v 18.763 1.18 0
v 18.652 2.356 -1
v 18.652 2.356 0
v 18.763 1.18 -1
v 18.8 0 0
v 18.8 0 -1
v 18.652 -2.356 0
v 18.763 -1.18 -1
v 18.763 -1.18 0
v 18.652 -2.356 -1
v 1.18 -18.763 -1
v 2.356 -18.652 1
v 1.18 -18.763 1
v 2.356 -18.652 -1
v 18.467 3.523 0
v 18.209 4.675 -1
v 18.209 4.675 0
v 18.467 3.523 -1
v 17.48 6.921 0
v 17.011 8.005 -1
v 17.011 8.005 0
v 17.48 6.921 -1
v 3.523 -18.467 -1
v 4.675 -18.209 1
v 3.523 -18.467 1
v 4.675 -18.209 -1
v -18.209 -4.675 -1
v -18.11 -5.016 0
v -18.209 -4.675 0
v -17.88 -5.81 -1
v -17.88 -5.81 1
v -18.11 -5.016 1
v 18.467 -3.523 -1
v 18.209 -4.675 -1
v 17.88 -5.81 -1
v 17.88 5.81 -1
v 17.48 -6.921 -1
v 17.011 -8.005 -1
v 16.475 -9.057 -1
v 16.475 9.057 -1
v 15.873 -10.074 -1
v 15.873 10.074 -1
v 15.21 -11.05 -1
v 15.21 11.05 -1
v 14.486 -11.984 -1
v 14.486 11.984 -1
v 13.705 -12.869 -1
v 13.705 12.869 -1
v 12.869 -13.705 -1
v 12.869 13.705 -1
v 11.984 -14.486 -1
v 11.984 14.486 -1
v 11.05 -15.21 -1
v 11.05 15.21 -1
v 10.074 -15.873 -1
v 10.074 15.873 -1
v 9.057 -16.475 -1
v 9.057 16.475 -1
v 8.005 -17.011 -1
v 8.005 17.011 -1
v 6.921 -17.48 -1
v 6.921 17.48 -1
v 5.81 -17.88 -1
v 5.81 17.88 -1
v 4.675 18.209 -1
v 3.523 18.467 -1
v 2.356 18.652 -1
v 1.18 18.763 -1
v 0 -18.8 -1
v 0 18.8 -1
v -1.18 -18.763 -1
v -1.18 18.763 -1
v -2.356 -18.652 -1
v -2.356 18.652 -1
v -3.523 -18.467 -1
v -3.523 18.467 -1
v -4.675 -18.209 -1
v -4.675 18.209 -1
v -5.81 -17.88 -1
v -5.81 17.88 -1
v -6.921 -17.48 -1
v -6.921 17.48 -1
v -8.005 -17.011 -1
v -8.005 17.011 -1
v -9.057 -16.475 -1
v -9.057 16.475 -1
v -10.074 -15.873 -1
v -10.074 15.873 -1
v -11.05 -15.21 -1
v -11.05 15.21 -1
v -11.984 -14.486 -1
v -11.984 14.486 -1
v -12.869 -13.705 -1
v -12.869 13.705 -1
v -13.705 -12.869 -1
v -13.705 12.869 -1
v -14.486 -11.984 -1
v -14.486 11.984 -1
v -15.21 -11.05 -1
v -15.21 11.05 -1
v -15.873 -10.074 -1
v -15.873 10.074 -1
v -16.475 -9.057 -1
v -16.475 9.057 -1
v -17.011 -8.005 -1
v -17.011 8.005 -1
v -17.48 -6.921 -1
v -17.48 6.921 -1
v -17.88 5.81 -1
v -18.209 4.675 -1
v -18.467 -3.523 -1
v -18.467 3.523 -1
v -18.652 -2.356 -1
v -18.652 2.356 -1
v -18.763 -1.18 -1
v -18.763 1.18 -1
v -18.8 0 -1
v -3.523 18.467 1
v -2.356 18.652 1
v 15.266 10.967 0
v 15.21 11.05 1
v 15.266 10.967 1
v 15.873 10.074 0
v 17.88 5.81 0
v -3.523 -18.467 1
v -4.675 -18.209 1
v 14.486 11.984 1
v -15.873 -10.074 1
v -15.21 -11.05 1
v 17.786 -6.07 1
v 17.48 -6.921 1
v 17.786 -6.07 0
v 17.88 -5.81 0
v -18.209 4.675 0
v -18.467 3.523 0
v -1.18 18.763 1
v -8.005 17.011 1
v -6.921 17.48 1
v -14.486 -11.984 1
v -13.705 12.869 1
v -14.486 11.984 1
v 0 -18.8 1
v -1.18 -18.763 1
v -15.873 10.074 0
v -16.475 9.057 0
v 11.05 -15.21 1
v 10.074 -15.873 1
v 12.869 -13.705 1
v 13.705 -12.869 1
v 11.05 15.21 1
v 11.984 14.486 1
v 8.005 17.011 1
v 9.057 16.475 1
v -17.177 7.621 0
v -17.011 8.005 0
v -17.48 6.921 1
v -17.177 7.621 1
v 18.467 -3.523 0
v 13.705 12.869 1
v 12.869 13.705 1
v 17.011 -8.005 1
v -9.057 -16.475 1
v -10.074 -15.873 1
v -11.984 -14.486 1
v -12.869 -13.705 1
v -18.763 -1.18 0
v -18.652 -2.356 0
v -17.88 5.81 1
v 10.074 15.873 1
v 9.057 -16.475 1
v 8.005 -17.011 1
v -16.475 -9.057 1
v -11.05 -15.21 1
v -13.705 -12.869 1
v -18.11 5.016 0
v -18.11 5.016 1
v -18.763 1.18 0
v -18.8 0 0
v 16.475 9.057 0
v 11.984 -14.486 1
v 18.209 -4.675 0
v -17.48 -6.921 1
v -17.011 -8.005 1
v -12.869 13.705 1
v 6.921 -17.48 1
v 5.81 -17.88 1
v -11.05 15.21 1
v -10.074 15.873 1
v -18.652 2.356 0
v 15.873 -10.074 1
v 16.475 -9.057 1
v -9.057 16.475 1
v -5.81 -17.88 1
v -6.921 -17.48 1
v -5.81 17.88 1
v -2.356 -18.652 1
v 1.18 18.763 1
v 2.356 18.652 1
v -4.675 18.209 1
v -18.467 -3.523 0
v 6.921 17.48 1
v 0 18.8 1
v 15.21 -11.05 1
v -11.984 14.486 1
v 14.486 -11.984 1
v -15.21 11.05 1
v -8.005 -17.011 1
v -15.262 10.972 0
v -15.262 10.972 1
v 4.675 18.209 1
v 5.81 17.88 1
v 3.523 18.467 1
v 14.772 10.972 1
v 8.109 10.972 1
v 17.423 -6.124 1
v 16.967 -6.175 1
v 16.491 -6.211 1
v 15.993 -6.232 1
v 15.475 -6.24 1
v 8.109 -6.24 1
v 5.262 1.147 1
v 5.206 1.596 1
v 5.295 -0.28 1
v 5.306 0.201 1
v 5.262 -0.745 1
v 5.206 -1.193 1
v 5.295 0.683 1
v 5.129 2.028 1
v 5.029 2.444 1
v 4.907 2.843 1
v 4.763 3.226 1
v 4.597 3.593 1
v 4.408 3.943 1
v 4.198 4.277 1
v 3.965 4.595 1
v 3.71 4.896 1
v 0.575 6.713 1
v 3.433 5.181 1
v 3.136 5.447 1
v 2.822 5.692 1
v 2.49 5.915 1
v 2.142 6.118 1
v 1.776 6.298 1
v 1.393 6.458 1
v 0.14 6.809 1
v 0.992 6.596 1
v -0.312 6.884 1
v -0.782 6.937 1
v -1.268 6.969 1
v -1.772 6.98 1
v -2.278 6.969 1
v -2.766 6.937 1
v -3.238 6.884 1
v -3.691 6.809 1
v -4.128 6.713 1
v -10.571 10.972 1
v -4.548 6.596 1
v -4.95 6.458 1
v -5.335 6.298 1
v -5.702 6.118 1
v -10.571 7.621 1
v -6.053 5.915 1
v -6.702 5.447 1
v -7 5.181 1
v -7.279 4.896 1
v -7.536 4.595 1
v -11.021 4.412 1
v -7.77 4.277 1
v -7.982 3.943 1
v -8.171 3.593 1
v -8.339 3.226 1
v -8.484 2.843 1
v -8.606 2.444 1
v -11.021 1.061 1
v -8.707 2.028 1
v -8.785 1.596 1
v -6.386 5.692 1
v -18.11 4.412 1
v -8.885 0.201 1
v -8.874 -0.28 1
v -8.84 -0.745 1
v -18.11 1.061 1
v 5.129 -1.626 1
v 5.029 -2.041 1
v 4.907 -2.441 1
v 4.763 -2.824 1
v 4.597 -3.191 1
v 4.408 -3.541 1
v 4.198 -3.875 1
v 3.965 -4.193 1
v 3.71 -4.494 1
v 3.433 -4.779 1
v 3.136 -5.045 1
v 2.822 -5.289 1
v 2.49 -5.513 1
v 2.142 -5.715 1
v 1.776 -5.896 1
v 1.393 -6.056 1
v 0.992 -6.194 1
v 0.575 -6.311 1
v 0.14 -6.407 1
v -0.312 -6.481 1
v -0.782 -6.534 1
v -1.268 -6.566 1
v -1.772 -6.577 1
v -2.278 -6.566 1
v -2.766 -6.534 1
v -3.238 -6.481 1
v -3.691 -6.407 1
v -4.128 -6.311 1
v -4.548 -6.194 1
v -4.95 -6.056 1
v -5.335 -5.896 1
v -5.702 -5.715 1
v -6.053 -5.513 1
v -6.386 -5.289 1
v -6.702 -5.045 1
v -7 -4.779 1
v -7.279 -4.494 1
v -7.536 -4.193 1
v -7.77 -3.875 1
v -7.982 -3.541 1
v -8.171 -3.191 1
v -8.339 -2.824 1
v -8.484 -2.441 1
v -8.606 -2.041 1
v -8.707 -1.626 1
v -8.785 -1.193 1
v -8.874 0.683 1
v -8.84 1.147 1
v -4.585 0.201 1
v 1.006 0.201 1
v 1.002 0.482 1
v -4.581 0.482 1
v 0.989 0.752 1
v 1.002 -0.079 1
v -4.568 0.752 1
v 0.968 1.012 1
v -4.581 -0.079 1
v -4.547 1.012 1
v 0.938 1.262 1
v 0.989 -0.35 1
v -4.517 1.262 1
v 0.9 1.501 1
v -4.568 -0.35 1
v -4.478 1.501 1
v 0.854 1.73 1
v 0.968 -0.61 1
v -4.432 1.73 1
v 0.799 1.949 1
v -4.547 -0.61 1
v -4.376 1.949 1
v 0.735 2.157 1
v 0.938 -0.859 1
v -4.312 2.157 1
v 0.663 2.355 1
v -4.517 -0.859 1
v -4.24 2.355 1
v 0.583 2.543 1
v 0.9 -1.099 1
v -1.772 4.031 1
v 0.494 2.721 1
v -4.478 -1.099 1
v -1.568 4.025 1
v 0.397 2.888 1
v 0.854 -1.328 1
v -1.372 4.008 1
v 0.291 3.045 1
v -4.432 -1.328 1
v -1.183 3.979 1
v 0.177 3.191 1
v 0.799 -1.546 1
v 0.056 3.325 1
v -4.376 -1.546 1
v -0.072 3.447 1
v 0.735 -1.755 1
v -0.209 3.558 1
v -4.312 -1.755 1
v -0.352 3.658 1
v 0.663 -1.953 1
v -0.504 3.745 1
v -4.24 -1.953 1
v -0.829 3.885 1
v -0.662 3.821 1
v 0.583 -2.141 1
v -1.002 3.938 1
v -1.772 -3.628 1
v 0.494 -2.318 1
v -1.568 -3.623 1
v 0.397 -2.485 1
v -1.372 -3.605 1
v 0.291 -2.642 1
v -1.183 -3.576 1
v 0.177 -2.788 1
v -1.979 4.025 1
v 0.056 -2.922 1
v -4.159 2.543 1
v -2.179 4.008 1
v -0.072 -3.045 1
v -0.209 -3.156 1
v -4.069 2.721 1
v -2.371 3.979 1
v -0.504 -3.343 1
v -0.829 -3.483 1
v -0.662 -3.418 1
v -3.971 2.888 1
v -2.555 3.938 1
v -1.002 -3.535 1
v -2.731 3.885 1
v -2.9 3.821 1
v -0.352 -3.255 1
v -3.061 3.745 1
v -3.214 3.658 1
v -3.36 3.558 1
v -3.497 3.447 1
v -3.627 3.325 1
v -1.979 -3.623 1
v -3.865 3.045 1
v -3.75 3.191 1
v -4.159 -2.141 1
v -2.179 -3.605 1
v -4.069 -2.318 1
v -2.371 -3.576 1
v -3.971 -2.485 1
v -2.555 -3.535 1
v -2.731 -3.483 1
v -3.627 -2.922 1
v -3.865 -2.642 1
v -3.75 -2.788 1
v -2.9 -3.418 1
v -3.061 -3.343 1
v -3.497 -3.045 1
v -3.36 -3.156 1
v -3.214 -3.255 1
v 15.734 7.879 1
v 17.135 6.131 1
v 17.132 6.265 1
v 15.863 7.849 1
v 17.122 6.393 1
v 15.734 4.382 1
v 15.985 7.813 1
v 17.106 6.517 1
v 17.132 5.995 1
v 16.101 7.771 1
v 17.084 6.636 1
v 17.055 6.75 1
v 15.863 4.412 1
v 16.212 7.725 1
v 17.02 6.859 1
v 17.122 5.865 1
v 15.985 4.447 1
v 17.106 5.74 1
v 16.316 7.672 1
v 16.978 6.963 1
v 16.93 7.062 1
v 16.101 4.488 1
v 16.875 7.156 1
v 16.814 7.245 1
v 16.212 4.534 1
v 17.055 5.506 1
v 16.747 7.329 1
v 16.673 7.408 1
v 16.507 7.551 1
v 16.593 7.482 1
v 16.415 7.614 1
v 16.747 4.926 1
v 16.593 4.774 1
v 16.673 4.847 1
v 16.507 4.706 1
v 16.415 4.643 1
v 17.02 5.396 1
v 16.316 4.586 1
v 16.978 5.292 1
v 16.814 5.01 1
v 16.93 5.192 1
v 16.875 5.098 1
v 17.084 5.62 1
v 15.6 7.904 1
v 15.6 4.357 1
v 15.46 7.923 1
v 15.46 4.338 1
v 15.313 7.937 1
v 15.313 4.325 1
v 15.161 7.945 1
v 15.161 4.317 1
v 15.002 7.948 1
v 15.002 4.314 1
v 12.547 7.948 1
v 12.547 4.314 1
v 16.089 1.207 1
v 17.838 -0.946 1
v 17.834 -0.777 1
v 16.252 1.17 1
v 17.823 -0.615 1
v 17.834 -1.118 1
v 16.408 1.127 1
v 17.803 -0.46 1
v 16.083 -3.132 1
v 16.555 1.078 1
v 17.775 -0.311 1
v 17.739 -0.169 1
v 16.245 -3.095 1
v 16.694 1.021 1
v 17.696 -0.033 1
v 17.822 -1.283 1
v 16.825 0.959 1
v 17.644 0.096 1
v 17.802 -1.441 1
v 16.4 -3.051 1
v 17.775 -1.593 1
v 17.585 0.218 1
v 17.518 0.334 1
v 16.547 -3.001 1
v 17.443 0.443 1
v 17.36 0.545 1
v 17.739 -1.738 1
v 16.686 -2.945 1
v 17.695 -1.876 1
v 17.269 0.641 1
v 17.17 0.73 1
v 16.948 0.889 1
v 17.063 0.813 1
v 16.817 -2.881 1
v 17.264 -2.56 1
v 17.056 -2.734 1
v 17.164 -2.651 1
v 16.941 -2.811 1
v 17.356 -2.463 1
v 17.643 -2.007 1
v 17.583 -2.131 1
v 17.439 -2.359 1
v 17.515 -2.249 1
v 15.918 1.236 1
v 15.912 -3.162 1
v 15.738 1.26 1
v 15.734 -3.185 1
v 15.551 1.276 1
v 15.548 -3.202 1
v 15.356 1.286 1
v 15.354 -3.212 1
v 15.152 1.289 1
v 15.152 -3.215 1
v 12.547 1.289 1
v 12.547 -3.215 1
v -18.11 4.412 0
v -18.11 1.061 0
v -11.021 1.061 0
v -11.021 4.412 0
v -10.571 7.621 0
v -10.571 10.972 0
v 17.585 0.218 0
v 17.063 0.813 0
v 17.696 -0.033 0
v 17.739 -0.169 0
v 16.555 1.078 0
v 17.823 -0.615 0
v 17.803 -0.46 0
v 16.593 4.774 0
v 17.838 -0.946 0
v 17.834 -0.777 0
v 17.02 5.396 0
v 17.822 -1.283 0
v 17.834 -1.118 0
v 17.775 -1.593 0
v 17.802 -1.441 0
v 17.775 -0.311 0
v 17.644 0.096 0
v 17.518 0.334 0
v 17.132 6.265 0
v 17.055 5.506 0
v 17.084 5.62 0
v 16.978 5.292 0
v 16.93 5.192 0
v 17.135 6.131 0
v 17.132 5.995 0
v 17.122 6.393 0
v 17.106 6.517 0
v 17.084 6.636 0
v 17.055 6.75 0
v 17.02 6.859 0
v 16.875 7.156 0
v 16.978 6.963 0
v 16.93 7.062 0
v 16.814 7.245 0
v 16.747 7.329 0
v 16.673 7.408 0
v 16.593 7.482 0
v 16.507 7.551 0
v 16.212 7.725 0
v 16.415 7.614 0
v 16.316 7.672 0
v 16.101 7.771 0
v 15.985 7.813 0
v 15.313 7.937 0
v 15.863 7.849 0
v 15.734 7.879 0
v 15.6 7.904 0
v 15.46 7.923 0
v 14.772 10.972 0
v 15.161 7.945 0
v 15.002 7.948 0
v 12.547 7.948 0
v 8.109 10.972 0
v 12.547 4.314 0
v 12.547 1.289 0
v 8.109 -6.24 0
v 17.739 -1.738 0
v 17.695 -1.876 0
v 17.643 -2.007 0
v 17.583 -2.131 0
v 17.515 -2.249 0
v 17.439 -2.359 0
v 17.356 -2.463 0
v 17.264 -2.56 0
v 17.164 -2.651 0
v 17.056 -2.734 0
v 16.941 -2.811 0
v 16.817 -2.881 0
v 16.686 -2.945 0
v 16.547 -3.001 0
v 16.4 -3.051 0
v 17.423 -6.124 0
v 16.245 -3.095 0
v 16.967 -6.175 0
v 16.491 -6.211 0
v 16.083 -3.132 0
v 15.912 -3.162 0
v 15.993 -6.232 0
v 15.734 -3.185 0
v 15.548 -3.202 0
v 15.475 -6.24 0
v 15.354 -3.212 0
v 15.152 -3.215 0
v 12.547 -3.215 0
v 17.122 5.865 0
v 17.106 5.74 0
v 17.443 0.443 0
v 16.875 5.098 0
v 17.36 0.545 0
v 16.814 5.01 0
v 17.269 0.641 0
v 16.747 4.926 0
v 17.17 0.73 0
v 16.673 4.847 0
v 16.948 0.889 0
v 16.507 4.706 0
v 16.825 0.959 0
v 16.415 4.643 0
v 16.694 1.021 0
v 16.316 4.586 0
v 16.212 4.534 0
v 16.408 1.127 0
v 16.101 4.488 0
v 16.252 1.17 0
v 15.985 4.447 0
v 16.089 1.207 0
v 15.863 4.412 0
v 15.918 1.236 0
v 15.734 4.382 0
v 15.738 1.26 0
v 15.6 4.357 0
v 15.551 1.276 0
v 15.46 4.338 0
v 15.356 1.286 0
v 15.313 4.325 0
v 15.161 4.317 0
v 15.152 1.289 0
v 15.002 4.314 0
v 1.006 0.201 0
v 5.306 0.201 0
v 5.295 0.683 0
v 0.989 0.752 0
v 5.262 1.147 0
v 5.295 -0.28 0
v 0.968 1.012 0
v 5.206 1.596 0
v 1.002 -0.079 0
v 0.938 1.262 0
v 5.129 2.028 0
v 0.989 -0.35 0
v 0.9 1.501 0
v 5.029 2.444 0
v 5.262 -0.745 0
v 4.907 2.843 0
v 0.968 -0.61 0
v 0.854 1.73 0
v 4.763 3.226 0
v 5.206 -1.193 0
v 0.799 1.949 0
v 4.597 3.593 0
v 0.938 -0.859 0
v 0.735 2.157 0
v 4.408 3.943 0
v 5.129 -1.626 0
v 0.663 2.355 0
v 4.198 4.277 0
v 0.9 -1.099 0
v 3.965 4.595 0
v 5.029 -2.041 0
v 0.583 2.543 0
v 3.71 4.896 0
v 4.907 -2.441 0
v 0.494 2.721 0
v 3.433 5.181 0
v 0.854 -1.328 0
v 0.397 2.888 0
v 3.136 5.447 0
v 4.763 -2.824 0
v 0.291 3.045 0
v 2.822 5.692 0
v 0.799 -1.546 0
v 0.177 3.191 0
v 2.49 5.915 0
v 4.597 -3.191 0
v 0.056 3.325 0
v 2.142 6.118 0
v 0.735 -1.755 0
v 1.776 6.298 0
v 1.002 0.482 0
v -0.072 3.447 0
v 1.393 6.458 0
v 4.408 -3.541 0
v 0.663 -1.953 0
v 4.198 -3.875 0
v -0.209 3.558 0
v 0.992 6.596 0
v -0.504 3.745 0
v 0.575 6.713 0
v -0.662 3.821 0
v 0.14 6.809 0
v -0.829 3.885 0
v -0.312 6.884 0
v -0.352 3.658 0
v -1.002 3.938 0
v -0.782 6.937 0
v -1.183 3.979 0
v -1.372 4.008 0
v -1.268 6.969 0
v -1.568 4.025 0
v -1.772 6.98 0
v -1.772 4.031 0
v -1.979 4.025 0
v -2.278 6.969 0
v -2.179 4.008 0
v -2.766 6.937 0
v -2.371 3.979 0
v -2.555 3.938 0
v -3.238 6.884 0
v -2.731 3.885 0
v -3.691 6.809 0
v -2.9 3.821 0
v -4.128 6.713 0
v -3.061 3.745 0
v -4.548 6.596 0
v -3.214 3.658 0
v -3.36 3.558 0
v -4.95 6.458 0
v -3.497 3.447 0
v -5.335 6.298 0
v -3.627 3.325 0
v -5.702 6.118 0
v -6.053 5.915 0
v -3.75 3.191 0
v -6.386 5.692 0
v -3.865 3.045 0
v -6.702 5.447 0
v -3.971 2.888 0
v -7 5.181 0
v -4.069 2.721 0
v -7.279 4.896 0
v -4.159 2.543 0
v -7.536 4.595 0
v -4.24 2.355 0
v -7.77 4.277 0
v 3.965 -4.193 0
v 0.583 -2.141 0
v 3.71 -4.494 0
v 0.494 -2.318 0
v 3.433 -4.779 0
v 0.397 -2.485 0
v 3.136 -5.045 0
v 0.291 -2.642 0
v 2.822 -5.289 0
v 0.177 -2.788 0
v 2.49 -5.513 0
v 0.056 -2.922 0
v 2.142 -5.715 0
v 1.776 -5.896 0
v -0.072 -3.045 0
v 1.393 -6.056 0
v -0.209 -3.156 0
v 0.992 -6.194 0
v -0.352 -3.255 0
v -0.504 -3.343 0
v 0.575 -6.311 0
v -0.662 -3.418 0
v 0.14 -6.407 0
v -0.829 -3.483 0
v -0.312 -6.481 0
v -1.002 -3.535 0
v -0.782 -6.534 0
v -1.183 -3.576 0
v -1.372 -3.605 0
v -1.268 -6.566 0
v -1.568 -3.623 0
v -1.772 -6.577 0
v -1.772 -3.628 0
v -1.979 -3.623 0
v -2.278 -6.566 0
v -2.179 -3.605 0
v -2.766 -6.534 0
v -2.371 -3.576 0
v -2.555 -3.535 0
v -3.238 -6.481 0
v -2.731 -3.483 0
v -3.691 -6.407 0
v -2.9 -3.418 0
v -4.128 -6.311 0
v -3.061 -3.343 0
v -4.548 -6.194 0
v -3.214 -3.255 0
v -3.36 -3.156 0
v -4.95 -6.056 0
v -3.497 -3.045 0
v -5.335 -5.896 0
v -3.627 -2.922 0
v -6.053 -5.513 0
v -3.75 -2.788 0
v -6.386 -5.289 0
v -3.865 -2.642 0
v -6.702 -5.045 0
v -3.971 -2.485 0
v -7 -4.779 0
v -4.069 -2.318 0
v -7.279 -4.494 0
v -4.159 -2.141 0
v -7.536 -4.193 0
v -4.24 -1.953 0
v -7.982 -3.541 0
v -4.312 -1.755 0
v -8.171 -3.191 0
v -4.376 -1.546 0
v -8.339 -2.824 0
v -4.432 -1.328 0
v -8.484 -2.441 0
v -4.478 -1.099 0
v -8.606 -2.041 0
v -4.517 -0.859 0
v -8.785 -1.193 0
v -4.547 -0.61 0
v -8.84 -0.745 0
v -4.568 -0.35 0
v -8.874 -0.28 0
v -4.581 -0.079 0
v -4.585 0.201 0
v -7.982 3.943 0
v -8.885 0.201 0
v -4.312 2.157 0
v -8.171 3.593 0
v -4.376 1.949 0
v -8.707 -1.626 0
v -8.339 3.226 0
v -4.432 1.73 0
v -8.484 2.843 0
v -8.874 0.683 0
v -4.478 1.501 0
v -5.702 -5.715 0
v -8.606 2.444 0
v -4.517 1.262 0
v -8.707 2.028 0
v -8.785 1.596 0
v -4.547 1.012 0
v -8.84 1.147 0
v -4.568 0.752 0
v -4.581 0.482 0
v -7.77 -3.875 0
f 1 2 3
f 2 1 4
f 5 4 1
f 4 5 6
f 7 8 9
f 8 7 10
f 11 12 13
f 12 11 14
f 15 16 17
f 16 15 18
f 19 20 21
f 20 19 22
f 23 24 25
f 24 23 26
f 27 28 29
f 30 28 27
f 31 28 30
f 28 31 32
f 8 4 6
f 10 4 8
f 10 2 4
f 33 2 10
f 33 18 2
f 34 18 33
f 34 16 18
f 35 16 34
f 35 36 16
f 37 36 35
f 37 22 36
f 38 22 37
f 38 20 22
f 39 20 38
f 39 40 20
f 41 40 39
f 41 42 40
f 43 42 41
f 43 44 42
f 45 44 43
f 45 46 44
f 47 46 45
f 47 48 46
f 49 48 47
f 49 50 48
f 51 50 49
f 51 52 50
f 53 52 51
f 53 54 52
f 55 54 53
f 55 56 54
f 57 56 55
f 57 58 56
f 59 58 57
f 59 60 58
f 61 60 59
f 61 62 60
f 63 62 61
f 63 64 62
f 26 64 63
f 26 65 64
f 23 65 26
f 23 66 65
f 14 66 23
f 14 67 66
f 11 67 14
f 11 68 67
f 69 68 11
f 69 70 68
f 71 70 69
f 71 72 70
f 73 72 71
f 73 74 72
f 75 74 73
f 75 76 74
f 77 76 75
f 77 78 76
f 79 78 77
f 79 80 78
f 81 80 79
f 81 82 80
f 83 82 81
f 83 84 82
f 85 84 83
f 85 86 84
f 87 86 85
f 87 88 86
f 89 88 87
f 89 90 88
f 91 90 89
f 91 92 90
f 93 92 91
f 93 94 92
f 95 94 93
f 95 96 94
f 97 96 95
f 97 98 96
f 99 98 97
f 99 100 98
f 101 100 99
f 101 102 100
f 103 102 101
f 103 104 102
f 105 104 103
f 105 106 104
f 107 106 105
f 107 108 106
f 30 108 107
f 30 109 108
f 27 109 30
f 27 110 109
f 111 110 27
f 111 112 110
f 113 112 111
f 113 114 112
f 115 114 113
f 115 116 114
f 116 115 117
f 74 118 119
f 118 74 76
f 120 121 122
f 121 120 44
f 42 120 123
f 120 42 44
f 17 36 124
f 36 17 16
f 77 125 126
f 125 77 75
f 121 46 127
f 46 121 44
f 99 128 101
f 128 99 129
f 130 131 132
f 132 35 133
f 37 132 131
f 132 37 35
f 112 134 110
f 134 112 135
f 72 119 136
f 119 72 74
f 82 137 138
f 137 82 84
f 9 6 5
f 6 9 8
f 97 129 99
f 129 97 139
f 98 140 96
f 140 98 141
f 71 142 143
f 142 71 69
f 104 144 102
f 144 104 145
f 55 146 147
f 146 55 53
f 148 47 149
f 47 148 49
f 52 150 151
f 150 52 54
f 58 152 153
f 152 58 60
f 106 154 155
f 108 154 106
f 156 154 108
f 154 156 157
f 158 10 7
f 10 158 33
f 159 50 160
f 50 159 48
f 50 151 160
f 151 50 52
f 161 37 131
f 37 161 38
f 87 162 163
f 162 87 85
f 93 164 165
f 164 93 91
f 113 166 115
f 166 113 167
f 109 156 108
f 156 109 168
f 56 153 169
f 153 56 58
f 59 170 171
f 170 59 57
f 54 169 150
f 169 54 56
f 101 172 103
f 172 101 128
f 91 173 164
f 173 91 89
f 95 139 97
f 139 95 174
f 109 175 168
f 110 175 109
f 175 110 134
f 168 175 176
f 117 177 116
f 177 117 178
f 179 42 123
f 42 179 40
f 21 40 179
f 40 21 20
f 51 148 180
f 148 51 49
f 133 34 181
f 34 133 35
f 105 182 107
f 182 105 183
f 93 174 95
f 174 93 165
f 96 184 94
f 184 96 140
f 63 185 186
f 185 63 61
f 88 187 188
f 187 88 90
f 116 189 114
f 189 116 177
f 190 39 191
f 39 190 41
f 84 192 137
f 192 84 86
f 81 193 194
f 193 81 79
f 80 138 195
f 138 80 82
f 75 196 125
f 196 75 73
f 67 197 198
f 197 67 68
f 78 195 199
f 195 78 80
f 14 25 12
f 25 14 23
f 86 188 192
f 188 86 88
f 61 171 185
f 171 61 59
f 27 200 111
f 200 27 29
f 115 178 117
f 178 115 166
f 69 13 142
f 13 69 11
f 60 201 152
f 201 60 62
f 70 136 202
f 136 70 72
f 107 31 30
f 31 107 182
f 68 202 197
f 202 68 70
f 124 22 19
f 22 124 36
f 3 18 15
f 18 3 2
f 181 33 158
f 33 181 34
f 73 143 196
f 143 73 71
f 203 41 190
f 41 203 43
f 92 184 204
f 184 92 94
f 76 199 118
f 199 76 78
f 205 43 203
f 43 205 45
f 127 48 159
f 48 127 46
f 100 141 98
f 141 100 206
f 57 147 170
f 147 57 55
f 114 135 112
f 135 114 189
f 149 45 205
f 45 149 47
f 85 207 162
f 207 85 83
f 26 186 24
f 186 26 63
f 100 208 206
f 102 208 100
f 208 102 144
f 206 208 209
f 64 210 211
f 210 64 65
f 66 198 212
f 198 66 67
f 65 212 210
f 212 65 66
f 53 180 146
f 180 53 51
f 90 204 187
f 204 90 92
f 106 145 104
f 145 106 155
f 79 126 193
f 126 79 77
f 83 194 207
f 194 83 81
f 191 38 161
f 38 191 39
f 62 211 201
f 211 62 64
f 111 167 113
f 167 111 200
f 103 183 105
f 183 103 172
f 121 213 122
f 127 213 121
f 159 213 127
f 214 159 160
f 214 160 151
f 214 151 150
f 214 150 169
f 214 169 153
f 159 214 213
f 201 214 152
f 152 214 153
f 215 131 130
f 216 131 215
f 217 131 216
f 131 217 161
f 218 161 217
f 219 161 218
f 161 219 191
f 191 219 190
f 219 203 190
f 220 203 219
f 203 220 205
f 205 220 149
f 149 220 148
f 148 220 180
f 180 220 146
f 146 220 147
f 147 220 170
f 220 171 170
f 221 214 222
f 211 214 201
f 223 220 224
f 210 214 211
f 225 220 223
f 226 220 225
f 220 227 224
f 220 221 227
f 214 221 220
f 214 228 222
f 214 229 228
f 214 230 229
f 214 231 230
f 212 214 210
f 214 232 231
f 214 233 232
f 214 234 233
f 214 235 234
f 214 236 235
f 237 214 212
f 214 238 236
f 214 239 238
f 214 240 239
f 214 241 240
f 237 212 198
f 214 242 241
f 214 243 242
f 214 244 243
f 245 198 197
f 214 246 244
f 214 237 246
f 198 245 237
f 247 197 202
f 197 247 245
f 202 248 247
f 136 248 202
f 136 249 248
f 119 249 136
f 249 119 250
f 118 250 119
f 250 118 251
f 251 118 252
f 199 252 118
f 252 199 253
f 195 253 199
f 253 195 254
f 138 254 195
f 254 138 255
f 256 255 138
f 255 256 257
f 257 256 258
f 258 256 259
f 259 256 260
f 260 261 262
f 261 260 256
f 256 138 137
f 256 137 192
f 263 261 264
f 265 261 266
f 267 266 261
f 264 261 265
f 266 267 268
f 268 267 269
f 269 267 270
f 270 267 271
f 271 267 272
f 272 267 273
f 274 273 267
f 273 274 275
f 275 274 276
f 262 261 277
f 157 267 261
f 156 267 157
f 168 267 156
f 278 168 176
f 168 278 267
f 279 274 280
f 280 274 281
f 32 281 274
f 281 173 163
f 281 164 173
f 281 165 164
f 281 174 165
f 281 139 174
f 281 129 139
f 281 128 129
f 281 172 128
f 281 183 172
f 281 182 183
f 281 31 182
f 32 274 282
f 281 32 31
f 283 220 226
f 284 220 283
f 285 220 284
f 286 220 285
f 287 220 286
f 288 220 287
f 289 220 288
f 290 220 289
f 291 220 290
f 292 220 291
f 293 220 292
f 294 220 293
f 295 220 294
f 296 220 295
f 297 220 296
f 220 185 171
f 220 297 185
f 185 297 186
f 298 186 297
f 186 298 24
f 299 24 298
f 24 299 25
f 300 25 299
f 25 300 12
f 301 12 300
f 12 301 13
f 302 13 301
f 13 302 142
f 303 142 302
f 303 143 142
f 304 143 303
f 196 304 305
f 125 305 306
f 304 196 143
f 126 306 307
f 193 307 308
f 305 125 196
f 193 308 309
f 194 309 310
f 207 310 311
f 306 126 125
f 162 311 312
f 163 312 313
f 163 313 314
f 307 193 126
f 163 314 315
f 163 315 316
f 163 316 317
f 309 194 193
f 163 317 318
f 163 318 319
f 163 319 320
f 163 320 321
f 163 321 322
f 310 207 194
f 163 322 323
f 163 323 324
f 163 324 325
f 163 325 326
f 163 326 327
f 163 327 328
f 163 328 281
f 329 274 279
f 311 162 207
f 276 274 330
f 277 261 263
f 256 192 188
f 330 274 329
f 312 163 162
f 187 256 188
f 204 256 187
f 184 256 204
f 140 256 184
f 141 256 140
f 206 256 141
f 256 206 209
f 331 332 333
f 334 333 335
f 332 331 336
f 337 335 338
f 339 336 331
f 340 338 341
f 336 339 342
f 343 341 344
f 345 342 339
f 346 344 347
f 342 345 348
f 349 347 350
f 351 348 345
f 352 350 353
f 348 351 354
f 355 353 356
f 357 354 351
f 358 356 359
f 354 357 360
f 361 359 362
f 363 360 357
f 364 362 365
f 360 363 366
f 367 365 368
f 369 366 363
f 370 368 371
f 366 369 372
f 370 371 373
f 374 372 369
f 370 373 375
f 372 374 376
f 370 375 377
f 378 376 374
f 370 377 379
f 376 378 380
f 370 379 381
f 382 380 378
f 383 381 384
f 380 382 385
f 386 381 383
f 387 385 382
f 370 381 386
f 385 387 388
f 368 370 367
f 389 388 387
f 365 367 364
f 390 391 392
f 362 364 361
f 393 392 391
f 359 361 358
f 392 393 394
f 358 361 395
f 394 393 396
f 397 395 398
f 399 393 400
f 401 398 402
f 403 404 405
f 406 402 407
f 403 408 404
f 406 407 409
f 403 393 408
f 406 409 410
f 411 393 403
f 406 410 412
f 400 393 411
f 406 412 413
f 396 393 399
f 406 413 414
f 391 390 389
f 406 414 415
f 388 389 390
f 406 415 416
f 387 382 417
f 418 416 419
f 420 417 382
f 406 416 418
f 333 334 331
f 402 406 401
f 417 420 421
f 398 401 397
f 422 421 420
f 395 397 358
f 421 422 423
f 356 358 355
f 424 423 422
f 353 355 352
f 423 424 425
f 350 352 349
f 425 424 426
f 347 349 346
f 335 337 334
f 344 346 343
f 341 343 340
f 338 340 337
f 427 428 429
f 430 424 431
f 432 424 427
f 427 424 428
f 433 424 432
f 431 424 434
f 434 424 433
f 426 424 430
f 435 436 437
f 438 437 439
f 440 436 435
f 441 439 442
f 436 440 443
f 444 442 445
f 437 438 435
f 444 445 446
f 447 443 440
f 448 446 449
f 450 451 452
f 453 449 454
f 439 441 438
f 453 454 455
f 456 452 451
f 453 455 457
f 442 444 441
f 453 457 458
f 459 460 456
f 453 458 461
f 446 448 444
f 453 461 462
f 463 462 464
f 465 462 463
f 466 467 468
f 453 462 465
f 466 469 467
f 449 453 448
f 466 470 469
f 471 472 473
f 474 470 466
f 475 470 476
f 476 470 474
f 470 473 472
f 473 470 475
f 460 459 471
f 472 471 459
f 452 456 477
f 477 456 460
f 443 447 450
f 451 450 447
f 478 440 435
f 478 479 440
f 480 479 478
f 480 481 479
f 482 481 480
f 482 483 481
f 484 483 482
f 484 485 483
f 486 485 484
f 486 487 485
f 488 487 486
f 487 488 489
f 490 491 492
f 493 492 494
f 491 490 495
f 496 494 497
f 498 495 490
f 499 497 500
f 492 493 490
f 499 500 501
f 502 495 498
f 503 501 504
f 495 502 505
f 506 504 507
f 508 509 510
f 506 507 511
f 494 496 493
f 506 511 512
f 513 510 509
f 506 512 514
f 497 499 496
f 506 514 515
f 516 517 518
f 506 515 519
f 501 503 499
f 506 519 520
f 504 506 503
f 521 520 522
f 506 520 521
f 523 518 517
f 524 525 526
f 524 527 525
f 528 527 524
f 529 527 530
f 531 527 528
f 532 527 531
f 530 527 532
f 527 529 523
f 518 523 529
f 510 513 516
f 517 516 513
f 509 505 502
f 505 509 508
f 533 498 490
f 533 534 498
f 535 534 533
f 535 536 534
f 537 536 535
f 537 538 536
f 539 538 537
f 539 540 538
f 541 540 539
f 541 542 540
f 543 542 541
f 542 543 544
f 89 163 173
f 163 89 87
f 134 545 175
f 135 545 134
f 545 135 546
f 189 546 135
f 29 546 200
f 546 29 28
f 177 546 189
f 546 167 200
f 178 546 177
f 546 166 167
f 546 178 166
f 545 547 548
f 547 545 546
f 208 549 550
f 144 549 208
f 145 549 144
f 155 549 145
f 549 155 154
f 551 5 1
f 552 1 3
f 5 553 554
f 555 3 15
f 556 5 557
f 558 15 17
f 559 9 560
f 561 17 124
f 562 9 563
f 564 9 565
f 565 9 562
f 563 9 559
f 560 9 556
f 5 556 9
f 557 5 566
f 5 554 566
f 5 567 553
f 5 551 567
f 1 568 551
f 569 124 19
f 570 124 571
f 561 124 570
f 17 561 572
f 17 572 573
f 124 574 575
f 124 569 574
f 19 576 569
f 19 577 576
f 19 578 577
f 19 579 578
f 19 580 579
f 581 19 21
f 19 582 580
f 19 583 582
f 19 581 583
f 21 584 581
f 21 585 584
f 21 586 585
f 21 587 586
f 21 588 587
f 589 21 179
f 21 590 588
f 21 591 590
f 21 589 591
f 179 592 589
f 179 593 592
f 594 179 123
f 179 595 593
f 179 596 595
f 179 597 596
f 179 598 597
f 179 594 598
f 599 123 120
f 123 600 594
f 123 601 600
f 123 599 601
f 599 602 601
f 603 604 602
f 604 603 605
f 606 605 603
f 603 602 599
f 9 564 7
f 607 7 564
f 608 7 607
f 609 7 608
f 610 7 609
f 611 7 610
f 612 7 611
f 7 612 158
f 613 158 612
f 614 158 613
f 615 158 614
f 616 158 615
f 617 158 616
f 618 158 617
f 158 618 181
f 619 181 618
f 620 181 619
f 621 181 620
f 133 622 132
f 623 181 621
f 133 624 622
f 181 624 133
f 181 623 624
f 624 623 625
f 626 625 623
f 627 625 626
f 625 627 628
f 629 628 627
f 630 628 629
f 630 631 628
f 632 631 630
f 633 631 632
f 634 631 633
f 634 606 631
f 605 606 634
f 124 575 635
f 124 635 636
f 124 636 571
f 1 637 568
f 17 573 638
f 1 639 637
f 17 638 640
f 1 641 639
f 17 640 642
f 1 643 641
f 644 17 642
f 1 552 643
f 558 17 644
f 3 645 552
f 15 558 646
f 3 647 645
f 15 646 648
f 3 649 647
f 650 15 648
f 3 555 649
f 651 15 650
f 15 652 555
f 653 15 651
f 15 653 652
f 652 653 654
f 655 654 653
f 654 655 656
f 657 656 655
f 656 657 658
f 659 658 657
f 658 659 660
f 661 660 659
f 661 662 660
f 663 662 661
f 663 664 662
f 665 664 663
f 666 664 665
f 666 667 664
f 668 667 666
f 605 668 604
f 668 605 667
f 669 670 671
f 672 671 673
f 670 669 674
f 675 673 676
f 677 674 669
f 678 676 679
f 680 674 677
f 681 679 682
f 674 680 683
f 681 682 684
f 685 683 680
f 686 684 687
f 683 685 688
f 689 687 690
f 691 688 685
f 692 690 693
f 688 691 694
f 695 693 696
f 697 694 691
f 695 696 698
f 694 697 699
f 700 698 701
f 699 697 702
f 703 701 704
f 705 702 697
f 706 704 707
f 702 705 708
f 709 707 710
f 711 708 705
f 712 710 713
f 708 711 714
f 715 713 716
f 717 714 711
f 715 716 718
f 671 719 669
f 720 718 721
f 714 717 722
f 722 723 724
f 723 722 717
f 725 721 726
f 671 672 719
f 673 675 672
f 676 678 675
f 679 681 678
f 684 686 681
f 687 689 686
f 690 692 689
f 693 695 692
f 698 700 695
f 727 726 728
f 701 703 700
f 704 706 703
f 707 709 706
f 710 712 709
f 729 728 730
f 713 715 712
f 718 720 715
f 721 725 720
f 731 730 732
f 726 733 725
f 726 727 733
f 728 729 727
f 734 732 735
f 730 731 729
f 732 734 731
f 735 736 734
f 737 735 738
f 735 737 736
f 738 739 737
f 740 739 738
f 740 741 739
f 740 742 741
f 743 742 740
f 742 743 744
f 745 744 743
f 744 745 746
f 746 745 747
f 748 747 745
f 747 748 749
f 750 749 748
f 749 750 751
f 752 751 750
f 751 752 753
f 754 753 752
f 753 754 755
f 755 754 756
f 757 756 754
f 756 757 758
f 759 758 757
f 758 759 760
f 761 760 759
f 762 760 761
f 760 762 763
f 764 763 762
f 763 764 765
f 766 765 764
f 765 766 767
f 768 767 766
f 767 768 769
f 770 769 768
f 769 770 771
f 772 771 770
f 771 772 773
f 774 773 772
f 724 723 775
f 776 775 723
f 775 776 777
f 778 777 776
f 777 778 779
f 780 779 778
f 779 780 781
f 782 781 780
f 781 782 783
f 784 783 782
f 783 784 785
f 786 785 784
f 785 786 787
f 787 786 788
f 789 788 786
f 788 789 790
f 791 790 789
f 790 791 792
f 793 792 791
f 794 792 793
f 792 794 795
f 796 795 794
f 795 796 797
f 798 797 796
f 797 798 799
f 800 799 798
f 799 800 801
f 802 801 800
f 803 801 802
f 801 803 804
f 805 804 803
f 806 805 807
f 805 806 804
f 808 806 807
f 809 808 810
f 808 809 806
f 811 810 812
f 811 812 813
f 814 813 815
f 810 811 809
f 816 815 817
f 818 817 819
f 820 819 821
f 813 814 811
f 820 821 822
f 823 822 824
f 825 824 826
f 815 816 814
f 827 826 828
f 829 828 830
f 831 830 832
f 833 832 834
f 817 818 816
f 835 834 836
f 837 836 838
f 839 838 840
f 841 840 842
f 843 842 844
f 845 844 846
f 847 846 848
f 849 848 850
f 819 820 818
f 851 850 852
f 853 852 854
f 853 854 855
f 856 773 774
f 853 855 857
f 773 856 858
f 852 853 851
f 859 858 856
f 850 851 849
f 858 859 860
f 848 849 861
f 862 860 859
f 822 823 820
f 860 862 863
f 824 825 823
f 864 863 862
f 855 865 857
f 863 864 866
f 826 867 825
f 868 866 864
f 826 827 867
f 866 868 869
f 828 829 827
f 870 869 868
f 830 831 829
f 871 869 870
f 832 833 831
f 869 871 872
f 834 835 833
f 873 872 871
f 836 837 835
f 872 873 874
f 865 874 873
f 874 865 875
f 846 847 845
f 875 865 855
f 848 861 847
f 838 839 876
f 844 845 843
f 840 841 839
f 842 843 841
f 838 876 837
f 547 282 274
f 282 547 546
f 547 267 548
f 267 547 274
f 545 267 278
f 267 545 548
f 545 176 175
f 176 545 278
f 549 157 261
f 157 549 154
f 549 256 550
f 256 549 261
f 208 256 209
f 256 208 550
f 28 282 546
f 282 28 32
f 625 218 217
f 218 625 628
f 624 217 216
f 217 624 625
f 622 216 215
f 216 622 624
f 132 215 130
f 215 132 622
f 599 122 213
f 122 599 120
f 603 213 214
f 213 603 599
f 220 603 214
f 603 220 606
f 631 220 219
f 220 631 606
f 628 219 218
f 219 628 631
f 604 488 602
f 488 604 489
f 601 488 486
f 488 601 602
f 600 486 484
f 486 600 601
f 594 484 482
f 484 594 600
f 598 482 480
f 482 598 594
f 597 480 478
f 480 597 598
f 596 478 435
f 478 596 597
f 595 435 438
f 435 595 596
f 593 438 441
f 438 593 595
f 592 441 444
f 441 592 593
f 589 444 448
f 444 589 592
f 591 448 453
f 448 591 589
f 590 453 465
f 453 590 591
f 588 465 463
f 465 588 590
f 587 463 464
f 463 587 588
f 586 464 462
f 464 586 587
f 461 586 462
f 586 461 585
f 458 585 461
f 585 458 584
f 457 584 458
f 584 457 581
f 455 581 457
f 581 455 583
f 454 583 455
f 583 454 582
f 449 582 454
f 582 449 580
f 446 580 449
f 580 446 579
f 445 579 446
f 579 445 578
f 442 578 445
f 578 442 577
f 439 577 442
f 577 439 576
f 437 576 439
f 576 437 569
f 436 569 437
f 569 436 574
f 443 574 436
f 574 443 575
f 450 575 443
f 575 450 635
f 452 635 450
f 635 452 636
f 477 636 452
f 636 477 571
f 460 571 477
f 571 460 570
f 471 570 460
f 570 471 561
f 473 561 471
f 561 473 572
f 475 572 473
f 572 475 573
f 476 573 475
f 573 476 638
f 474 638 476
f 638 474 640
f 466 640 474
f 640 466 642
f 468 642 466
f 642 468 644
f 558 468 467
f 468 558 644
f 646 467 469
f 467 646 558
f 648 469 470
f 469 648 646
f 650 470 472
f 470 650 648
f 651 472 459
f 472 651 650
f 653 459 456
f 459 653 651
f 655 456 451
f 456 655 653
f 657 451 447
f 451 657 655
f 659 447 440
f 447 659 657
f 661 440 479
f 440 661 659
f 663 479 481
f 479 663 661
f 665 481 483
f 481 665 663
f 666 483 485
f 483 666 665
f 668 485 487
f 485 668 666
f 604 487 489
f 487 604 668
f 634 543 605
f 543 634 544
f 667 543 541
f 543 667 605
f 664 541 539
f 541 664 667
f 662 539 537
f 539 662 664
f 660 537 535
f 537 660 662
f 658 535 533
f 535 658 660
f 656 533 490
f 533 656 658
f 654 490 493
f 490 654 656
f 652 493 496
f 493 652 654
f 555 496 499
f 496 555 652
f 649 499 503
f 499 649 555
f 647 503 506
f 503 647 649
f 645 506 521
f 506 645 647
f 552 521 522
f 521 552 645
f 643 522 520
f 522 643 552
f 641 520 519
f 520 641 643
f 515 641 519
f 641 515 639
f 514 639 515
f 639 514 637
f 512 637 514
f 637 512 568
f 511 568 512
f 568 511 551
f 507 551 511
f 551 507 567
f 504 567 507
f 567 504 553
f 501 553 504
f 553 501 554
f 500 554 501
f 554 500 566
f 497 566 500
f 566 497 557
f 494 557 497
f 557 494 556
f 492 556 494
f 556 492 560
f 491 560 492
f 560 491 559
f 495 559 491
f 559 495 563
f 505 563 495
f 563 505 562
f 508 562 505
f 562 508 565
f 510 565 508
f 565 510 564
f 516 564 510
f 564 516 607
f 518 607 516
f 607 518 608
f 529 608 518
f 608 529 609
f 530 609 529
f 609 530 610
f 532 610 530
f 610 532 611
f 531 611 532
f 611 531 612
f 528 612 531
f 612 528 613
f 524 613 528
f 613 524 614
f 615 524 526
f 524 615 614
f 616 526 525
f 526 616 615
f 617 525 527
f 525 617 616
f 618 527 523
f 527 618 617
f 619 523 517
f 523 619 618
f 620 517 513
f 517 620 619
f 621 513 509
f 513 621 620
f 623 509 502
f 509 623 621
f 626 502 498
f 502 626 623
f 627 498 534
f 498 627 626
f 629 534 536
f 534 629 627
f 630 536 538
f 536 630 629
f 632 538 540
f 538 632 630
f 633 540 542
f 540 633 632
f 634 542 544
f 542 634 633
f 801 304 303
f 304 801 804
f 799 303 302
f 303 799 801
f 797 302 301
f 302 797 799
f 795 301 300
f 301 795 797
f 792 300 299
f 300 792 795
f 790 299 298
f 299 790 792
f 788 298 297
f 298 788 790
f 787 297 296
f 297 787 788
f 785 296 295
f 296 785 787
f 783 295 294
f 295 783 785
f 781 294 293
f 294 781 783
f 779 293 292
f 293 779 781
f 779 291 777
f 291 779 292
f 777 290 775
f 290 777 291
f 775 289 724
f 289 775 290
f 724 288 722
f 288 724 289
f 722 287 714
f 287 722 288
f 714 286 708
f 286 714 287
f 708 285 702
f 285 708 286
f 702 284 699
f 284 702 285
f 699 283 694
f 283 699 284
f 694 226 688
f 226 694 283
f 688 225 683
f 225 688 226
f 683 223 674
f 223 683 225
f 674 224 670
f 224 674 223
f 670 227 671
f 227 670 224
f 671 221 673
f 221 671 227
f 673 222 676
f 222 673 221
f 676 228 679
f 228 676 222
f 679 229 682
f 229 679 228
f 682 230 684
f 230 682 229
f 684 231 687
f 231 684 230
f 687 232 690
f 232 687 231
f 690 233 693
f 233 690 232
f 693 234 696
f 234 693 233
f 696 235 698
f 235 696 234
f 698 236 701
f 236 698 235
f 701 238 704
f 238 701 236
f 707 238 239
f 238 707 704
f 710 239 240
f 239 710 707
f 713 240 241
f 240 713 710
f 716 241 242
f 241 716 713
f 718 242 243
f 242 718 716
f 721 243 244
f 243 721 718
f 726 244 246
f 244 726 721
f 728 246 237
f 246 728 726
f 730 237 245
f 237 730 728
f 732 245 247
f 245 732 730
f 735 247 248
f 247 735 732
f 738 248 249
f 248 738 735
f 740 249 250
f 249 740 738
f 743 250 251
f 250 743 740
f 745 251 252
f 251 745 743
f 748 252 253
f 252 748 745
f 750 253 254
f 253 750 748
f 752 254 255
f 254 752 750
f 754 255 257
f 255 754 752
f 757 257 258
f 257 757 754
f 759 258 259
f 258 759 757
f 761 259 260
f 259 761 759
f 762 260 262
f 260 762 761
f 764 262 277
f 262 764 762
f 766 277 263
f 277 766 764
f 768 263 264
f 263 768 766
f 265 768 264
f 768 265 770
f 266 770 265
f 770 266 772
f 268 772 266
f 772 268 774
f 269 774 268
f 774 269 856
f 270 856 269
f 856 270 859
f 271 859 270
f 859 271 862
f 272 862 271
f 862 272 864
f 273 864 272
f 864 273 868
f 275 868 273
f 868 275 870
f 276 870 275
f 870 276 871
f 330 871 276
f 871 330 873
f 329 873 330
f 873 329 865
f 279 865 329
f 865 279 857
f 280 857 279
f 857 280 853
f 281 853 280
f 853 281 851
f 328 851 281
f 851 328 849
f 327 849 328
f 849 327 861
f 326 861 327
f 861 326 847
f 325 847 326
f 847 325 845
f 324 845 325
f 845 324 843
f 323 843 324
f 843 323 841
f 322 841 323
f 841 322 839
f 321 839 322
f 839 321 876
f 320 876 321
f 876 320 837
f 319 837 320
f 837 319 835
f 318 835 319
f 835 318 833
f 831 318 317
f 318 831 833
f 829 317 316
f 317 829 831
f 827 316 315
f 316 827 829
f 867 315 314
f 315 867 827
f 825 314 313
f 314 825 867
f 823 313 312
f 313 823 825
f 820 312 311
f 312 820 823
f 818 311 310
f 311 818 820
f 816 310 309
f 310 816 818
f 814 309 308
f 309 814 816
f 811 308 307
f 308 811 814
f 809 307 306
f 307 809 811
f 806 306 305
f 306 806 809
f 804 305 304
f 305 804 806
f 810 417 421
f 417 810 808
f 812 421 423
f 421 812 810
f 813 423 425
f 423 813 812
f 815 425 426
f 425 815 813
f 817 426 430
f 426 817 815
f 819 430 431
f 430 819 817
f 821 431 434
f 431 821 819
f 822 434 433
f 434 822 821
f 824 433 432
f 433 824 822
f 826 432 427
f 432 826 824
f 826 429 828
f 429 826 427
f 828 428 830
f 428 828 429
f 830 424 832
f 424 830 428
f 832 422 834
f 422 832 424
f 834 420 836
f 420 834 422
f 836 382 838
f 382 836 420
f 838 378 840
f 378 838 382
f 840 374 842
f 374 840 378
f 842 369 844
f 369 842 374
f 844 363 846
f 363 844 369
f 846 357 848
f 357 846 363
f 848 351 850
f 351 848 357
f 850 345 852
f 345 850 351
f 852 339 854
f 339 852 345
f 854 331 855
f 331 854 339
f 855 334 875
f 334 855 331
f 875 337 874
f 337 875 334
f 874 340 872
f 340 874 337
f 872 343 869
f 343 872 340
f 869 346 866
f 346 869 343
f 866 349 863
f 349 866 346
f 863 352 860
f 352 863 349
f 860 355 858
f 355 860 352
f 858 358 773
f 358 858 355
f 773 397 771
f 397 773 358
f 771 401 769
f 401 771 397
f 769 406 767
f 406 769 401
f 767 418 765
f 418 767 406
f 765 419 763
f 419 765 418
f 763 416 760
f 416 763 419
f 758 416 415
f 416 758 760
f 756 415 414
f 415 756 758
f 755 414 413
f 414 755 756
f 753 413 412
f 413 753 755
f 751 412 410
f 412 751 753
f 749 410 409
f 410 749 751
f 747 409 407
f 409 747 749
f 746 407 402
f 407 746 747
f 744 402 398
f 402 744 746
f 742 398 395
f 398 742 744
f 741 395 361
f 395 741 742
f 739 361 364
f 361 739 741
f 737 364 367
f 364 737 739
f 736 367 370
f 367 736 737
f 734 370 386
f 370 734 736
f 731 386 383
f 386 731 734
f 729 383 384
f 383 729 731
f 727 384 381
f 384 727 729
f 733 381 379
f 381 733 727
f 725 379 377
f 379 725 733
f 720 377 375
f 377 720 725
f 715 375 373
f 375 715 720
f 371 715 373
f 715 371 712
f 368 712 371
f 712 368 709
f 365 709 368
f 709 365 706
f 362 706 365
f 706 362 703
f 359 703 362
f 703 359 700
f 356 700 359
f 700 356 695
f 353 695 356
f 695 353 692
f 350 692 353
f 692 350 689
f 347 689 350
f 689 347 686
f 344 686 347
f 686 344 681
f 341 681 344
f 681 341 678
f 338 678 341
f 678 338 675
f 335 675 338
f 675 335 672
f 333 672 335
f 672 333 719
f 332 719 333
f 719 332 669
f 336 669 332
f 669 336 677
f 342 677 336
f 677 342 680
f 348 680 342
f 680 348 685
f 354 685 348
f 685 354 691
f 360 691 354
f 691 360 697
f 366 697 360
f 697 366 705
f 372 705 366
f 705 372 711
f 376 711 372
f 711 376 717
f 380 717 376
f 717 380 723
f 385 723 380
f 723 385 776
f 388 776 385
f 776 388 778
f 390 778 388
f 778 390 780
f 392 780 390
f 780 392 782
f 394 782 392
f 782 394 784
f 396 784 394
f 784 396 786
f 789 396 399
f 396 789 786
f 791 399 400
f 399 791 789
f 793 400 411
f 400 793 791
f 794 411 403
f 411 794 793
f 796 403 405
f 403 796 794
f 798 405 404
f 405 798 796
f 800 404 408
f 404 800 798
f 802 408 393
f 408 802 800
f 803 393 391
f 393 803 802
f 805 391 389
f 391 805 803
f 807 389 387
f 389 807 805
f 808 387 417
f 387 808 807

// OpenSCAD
//Flask of Bubbles

//Your text
text = "FoB";
//Size of the font
size = 17;//[2:1:24]
//Text vertical position
position = 2;//[-10:1:10]


//Font. Type in the font name
font_family = "French Script MT";
// Font weight. bold/italic/light
font_weight = "bold";

//Resolution. 
resolution = 100;//[10:10:100]

$fn=resolution;
   

difference () {
cylinder(h=2,r=18.8,center=true);
translate([-0.6,position,0]){
linear_extrude(height=2) {
text(
    text,
    font = str(font_family, ":style=", font_weight),
    size=size,
    halign="center",
    valign="center");
}
}
}
